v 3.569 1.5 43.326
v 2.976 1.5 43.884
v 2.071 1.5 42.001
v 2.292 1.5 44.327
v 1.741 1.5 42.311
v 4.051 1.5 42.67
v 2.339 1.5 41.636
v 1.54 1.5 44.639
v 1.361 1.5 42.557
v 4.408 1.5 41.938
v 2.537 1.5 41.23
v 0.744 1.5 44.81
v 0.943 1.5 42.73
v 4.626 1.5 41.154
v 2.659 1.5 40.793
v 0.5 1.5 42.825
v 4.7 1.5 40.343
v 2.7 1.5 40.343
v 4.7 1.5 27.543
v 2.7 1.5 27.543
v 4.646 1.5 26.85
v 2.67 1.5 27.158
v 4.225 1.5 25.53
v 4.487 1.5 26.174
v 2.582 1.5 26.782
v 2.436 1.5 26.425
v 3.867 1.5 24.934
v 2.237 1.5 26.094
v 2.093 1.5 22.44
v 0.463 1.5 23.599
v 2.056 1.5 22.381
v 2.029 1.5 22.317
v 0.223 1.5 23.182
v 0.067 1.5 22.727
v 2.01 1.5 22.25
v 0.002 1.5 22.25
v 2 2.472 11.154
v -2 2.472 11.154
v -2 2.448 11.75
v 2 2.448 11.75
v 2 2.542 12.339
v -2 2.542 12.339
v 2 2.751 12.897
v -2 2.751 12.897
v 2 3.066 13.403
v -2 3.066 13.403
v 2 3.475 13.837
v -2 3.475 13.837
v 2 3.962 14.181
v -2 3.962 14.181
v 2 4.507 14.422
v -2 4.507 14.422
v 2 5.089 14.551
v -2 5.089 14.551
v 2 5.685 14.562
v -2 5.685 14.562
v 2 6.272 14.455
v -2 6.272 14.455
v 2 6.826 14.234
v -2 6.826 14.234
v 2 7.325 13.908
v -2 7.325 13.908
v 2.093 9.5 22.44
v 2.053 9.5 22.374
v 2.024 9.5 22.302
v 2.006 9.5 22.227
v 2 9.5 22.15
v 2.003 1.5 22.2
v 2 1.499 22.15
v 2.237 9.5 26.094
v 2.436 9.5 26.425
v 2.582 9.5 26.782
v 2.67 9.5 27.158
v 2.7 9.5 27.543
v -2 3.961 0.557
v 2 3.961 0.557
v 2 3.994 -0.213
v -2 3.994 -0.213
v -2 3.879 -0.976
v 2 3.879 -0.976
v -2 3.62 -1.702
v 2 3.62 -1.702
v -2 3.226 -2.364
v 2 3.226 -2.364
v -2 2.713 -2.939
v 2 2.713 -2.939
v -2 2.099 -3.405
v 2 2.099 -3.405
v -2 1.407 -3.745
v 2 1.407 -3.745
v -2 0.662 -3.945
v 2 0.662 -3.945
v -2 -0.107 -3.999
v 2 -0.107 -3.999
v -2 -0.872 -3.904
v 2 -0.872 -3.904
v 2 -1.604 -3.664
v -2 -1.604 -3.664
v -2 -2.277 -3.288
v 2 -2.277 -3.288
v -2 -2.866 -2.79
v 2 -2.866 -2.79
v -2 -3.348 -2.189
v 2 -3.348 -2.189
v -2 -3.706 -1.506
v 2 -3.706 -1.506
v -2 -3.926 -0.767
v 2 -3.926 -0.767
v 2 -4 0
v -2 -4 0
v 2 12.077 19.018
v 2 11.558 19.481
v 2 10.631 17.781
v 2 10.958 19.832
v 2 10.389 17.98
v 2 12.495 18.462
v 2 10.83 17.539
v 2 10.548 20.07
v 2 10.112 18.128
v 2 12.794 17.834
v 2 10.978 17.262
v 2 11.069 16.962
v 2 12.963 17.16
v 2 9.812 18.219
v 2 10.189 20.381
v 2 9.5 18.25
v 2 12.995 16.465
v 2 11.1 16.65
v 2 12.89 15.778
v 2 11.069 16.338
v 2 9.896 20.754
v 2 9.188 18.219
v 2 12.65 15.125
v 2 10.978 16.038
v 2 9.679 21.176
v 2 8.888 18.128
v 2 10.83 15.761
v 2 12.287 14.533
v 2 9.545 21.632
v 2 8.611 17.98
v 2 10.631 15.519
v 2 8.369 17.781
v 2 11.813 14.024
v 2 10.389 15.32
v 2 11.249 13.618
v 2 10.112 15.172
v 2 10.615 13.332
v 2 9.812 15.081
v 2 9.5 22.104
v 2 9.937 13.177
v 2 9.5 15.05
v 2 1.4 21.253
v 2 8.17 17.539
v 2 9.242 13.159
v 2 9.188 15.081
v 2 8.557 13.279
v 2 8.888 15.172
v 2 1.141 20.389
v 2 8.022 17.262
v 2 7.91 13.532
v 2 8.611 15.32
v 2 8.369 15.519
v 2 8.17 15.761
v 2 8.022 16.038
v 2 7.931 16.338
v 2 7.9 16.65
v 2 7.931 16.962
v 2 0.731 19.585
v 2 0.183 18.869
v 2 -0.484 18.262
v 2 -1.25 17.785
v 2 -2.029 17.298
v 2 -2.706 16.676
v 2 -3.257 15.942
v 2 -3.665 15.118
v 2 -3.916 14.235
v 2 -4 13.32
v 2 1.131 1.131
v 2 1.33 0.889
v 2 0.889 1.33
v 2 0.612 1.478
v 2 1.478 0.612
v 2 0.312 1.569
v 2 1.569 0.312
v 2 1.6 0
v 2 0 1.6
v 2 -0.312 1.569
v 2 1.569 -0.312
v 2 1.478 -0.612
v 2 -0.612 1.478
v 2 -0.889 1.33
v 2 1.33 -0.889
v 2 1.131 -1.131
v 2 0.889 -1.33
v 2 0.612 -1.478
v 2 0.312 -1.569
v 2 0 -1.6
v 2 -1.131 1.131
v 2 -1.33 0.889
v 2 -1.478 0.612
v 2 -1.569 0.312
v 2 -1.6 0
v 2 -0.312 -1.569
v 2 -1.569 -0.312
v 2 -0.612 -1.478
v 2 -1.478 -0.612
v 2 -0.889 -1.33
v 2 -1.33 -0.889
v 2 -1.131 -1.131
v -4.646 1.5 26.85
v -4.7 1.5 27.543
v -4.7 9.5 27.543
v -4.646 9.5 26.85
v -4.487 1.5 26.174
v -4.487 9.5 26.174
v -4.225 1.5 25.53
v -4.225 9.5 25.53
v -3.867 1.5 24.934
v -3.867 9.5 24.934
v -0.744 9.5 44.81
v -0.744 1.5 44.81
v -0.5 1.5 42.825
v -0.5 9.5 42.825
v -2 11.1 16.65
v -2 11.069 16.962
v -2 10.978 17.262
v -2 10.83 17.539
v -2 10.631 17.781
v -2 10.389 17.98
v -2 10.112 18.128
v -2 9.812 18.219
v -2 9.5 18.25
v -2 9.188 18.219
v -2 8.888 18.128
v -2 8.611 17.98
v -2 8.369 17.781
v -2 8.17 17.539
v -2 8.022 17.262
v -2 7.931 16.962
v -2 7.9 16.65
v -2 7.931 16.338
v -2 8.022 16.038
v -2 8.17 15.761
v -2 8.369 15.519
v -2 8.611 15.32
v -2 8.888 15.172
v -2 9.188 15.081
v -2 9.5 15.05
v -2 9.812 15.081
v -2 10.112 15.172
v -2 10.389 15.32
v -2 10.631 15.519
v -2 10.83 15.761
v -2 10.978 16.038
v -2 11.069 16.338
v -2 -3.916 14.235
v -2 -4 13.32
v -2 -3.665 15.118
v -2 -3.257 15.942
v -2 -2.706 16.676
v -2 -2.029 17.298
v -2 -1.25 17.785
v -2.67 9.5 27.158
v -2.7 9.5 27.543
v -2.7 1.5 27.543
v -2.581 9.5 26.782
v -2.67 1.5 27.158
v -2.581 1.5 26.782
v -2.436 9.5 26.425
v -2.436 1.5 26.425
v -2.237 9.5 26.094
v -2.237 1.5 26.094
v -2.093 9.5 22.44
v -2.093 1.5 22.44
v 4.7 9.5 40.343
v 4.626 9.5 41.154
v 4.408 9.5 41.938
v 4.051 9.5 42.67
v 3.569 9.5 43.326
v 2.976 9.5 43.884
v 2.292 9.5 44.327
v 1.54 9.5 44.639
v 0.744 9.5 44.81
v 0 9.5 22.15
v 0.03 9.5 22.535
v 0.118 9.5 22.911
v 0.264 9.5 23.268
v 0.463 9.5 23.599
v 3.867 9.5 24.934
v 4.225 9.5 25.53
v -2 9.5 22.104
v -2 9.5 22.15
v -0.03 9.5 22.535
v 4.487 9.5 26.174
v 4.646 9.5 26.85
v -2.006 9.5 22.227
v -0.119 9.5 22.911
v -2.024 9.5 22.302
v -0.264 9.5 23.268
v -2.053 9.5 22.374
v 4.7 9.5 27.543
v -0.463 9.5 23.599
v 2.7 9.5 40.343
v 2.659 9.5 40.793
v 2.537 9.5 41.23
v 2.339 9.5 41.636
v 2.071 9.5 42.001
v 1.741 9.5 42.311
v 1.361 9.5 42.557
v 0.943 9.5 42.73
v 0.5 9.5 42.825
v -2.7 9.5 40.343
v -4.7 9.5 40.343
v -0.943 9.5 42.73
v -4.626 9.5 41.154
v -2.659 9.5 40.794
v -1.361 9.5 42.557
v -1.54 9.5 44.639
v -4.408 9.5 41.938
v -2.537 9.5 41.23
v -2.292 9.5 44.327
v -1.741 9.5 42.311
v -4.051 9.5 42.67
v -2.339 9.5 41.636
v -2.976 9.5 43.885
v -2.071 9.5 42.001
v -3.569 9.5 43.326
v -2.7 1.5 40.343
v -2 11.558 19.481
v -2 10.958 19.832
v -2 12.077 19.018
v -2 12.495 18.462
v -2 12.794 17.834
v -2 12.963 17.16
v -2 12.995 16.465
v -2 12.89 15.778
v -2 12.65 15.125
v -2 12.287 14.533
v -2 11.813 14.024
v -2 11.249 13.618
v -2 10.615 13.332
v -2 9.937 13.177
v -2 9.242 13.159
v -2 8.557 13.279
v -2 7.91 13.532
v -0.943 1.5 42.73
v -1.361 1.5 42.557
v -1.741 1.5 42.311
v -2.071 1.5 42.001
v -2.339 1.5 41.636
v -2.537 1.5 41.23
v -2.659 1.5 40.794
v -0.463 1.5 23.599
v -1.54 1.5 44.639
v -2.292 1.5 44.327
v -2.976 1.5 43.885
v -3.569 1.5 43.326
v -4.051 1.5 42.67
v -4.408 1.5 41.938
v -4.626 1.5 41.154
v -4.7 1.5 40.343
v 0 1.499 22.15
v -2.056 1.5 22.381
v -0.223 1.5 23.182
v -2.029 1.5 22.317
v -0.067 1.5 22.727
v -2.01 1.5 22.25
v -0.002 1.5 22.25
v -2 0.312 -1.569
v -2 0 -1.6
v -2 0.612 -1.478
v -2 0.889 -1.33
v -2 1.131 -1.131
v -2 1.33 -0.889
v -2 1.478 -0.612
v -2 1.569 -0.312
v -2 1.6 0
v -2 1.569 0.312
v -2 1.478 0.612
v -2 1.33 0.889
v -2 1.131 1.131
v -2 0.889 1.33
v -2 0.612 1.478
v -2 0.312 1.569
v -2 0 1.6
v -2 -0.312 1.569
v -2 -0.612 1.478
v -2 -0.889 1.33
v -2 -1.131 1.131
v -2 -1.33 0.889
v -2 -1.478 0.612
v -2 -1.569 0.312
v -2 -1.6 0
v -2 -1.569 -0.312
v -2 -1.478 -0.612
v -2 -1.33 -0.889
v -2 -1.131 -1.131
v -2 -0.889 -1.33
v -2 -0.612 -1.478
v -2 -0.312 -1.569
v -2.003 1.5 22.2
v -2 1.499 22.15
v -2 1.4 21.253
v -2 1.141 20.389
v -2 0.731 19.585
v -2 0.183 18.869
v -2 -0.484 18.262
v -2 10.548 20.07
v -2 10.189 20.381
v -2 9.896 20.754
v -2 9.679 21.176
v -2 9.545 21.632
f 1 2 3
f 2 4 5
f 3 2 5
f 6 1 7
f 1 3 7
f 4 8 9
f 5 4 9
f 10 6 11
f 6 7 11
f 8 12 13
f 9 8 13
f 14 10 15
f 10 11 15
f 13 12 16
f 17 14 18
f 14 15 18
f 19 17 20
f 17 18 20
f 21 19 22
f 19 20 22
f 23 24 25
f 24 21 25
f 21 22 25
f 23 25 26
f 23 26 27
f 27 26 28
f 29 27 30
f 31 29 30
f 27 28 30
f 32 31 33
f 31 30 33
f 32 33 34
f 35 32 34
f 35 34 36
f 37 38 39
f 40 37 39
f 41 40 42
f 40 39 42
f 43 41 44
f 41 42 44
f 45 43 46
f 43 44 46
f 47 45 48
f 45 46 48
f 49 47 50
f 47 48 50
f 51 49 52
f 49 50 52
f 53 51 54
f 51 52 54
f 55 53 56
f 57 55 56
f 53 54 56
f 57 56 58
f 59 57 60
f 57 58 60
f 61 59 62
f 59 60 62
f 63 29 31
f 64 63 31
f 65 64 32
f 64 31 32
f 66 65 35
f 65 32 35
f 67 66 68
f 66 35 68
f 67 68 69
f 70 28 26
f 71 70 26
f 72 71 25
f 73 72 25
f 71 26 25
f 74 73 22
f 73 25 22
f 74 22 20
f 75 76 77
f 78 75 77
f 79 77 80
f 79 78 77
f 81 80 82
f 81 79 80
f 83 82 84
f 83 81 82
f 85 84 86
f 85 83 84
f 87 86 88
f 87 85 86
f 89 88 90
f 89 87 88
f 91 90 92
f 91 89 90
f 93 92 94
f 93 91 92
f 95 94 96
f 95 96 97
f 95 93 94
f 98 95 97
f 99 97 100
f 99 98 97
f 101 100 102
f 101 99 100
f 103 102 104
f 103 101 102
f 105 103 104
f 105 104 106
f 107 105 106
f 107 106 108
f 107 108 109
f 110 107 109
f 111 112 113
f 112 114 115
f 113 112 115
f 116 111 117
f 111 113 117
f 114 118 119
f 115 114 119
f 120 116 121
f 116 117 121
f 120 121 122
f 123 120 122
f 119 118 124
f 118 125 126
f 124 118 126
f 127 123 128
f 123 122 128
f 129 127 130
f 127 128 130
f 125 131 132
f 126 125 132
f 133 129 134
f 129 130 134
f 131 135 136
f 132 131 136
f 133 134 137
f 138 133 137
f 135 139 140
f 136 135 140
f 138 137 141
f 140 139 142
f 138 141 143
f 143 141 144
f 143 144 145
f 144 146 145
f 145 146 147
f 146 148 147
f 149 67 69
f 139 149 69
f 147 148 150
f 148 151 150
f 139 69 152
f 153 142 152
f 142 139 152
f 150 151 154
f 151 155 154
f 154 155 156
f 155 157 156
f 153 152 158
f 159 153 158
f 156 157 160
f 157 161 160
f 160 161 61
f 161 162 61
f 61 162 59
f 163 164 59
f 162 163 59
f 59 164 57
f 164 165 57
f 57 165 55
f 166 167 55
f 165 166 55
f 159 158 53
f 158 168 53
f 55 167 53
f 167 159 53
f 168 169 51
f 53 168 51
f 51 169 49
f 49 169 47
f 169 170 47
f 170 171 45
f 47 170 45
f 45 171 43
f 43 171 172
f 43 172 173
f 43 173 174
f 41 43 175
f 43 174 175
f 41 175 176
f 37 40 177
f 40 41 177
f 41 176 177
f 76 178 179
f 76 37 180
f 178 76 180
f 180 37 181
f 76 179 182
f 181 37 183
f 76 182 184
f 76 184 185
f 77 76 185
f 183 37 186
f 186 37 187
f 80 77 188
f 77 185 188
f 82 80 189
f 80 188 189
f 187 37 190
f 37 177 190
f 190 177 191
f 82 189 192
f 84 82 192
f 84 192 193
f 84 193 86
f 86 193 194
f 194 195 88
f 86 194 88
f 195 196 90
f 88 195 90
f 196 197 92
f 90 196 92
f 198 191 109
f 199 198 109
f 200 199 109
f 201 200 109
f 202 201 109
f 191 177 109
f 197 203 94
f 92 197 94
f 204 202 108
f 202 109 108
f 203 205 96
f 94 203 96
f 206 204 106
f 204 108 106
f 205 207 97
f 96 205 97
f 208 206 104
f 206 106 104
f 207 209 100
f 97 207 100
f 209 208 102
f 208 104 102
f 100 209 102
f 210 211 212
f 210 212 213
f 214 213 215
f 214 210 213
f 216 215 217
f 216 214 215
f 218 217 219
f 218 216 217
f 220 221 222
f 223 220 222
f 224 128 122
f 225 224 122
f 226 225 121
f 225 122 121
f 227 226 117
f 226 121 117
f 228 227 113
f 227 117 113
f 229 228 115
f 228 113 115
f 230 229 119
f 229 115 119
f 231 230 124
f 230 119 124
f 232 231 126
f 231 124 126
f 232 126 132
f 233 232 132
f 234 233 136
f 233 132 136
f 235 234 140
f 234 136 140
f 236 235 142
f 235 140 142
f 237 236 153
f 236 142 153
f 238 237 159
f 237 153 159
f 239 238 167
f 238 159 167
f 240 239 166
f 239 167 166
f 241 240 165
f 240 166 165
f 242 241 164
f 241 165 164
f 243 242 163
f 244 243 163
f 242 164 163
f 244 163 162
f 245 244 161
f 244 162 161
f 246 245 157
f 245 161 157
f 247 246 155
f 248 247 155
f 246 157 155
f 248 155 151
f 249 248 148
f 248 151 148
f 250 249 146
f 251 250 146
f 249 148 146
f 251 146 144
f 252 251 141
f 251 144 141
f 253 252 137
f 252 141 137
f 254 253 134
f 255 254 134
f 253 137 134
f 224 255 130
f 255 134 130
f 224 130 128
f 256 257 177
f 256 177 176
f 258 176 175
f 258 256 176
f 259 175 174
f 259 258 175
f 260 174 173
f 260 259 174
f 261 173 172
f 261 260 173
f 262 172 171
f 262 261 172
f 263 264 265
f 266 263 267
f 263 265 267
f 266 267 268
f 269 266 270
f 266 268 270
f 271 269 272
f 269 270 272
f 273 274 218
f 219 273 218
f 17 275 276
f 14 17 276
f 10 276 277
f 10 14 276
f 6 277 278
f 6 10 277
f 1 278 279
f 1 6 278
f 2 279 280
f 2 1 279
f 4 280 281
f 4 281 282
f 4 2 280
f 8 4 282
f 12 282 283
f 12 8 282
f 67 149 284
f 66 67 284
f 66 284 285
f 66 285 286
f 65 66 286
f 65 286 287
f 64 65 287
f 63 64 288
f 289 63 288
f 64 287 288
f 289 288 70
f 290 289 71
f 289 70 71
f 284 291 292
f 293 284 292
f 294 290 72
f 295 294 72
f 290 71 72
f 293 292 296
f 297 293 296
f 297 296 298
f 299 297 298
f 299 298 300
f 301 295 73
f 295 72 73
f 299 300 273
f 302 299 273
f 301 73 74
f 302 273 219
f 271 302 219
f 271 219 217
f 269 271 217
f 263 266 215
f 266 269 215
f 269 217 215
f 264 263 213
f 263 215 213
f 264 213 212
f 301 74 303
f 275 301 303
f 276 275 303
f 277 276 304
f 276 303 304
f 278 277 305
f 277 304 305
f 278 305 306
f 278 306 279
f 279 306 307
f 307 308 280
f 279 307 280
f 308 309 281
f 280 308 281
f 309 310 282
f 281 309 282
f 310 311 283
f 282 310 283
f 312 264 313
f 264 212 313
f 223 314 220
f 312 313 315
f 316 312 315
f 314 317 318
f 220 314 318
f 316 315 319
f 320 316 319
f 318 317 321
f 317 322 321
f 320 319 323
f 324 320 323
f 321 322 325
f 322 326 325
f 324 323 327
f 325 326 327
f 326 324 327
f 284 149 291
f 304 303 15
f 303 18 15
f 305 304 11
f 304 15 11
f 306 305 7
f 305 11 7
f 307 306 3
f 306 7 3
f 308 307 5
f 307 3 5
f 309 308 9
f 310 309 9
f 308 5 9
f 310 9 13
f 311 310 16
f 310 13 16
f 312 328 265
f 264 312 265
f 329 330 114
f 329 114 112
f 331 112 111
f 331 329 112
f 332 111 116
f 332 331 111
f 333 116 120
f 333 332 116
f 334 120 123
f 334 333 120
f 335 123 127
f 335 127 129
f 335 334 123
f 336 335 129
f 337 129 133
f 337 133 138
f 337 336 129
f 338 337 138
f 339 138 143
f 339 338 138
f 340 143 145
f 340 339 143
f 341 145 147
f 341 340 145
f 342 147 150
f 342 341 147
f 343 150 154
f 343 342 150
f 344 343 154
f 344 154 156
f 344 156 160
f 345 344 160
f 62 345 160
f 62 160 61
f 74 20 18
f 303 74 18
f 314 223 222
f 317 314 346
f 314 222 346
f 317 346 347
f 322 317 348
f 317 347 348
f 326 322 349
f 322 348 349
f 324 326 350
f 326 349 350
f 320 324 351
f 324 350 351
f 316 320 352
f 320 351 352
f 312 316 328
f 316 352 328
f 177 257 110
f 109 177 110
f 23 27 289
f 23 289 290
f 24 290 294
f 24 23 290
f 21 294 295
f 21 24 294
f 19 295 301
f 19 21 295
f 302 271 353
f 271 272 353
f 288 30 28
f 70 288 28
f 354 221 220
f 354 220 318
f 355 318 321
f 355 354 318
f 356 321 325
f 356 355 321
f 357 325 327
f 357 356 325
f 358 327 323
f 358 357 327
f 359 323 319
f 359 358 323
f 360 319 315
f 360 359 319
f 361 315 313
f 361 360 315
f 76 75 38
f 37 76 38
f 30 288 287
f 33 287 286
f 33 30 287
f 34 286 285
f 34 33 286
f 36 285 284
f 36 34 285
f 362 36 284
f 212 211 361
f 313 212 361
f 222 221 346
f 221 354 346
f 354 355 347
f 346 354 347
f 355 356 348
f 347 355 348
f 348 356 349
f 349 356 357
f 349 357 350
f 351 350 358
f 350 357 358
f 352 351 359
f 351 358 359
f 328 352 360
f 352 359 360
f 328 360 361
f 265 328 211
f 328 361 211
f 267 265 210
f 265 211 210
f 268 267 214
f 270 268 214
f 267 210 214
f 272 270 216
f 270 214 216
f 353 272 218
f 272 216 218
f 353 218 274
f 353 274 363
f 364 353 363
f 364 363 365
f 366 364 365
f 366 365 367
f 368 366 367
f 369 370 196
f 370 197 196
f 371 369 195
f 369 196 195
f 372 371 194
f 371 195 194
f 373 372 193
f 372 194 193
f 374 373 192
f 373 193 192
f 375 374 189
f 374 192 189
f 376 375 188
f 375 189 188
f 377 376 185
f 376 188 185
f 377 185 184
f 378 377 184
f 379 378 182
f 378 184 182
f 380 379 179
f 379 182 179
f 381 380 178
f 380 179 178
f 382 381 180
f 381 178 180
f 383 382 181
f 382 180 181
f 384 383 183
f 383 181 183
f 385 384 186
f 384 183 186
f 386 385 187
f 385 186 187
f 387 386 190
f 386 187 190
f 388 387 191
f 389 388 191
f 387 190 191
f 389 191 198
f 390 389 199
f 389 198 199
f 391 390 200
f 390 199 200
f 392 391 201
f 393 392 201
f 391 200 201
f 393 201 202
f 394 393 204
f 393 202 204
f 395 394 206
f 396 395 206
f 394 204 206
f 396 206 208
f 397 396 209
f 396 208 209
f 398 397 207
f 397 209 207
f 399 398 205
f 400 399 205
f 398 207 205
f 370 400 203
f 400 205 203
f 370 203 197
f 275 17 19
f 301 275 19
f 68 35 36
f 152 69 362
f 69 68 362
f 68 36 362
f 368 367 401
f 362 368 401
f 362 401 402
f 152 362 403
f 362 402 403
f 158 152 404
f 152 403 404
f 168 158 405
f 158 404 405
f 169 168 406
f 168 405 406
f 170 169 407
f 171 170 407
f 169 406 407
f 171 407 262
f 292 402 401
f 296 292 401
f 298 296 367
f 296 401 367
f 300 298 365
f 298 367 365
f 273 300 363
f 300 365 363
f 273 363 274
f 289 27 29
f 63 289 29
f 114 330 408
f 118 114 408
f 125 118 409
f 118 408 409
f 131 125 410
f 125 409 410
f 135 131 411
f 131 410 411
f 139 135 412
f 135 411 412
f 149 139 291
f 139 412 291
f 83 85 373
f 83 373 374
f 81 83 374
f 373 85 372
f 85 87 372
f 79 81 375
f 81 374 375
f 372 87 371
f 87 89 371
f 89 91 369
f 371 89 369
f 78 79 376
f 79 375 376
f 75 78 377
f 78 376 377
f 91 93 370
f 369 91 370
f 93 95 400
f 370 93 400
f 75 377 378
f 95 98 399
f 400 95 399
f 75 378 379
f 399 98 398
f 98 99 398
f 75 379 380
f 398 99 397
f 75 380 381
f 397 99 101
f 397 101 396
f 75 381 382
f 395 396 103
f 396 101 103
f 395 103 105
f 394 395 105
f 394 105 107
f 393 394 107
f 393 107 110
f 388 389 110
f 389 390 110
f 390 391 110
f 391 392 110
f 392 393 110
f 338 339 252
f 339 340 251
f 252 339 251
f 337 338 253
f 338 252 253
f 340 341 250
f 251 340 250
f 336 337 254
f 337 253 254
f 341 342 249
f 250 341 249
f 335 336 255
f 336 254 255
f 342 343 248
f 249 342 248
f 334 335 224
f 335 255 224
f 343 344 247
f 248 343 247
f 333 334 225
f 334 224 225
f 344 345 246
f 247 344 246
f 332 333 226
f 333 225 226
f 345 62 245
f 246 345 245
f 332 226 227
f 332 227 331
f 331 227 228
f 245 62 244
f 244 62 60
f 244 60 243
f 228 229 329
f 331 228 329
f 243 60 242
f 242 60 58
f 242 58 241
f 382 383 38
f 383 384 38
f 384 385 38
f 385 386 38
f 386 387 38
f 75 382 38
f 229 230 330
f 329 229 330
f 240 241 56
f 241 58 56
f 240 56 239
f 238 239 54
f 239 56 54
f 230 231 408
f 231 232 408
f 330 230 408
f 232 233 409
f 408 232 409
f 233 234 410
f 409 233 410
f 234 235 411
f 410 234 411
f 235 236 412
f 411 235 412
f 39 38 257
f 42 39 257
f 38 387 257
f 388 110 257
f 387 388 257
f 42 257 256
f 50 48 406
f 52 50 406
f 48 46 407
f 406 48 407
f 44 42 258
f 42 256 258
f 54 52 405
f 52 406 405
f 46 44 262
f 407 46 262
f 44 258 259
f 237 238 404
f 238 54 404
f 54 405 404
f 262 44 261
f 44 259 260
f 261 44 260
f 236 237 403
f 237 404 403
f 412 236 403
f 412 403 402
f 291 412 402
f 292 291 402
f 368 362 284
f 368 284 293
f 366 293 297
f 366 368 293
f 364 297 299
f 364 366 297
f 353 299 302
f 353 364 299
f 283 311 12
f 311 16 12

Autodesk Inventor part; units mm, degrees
sketch "Skizze_1" plane through (0, 0, 0) normal (0, 1, 0) x (-1, 0, 0)
  line L0 (4.7, 27.5428) -> (4.7, 40.3427)
  arc A0 (4.7, 40.3427) -> (0.7437, 44.8097) centre (0.2, 40.3427) ccw
  line L1 (0.7437, 44.8097) -> (0.5, 42.8246)
  arc A1 (2.7, 40.3427) -> (0.5, 42.8246) centre (0.2, 40.3427) ccw
  line L2 (2.7, 40.3427) -> (2.7, 27.5428)
  arc A2 (2.2372, 26.0938) -> (2.7, 27.5428) centre (0.2, 27.5428) ccw
  line L3 (2.2372, 26.0938) -> (0.4628, 23.599)
  arc A3 (0.4628, 23.599) -> (0, 22.15) centre (2.5, 22.15) ccw
  arc A4 (0, 22.15) -> (-0.4628, 23.599) centre (-2.5, 22.15) ccw
  line L4 (-0.4628, 23.599) -> (-2.2372, 26.0938)
  arc A5 (-2.7, 27.5428) -> (-2.2372, 26.0938) centre (-0.2, 27.5428) ccw
  line L5 (-2.7, 27.5428) -> (-2.7, 40.3427)
  arc A6 (-0.5, 42.8246) -> (-2.7, 40.3427) centre (-0.2, 40.3427) ccw
  line L6 (-0.5, 42.8246) -> (-0.7437, 44.8097)
  arc A7 (-0.7437, 44.8097) -> (-4.7, 40.3427) centre (-0.2, 40.3427) ccw
  line L7 (-4.7, 40.3427) -> (-4.7, 27.5428)
  arc A8 (-4.7, 27.5428) -> (-3.867, 24.9345) centre (-0.2, 27.5428) ccw
  line L8 (-3.867, 24.9345) -> (-2.0926, 22.4398)
  arc A9 (-2, 22.15) -> (-2.0926, 22.4398) centre (-2.5, 22.15) ccw
  line L9 (-2, 22.15) -> (-2, -4)
  line L10 (-2, -4) -> (2, -4)
  line L11 (2, -4) -> (2, 22.15)
  arc A10 (2.0926, 22.4398) -> (2, 22.15) centre (2.5, 22.15) ccw
  line L12 (2.0926, 22.4398) -> (3.867, 24.9345)
  arc A11 (3.867, 24.9345) -> (4.7, 27.5428) centre (0.2, 27.5428) ccw
extrude "Extrusion1" add sketch "Skizze_1" along normal mid plane 40
sketch "Skizze_2" plane through (0, 0, 0) normal (1, 0, 0) x (0, 1, 0)
  line L0 (-60, 105) -> (-60, -73)
  line L1 (-60, -73) -> (65, -73)
  line L2 (65, -73) -> (65, 105)
  line L3 (65, 105) -> (-60, 105)
  line L4 (1.5, 44.8175) -> (1.5, 22.25)
  arc A0 (-1.25, 17.7848) -> (1.5, 22.25) centre (-3.5, 22.25) ccw
  arc A1 (-1.25, 17.7848) -> (-4, 13.3197) centre (1, 13.3197) ccw
  line L5 (-4, 13.3197) -> (-4, 0)
  arc A2 (-4, 0) -> (3.9611, 0.5567) centre (0, 0) ccw
  line L6 (3.9611, 0.5567) -> (2.4717, 11.1545)
  arc A3 (7.3248, 13.908) -> (2.4717, 11.1545) centre (5.4425, 11.572) ccw
  arc A4 (7.3248, 13.908) -> (10.9583, 19.8317) centre (9.5, 16.65) ccw
  arc A5 (9.5, 22.1044) -> (10.9583, 19.8317) centre (12, 22.1044) ccw
  line L7 (9.5, 22.1044) -> (9.5, 44.8175)
  line L8 (9.5, 44.8175) -> (1.5, 44.8175)
extrude "Extrusion2" cut sketch "Skizze_2" along normal mid plane 40
sketch "Skizze_3_ALT_Drilling_1" plane through (0, 0, 0) normal (0, 1, 0) x (-1, 0, 0)
  line L0 (-10, 0) -> (10, 0)
  line L1 (10, 0) -> (10, -1.6)
  line L2 (10, -1.6) -> (-10, -1.6)
  line L3 (-10, -1.6) -> (-10, 0)
  line L4 (-10, 0) -> (10, 0)
revolve "Revolution1" cut sketch "Skizze_3_ALT_Drilling_1" angle 360 about axis through (10, 0, 0) along (1, 0, 0)
sketch "Skizze_4_ALT_Drilling_2" plane through (0, 0, 16.65) normal (0, 0, 1) x (1, 0, 0)
  line L0 (10, 9.5) -> (-10, 9.5)
  line L1 (-10, 9.5) -> (-10, 11.1)
  line L2 (-10, 11.1) -> (10, 11.1)
  line L3 (10, 11.1) -> (10, 9.5)
  line L4 (10, 9.5) -> (-10, 9.5)
revolve "Revolution2" cut sketch "Skizze_4_ALT_Drilling_2" angle 360 about axis through (10, 9.5, 16.65) along (1, 0, 0)
ref_plane "P1_XY" through (0, 9.5, 34.5093) normal (0, 1, 0) x (1, 0, 0)
ref_plane "P1_YZ" through (0, 9.5, 34.5093) normal (1, 0, 0) x (0, 0, -1)
ref_plane "P1_ZX" through (0, 9.5, 34.5093) normal (0, 0, -1) x (0, 1, 0)
ref_plane "P2_XY" through (0, 1.5, 34.5093) normal (0, 1, 0) x (1, 0, 0)
ref_plane "P2_YZ" through (0, 1.5, 34.5093) normal (1, 0, 0) x (0, 0, -1)
ref_plane "P2_ZX" through (0, 1.5, 34.5093) normal (0, 0, -1) x (0, 1, 0)
ref_plane "SA1_XY" through (0, 0, 0) normal (1, 0, 0) x (0, 0, -1)
ref_plane "SA1_YZ" through (0, 0, 0) normal (0, 0, -1) x (0, 1, 0)
ref_plane "SA1_ZX" through (0, 0, 0) normal (0, 1, 0) x (1, 0, 0)
ref_plane "SA2_XY" through (0, 9.5, 16.65) normal (1, 0, 0) x (0, 0, -1)
ref_plane "SA2_YZ" through (0, 9.5, 16.65) normal (0, 0, -1) x (0, 1, 0)
ref_plane "SA2_ZX" through (0, 9.5, 16.65) normal (0, 1, 0) x (1, 0, 0)
ref_plane "SA3_XY" through (0, 5.5, 34.5093) normal (0, 0, 1) x (1, 0, 0)
ref_plane "SA3_YZ" through (0, 5.5, 34.5093) normal (1, 0, 0) x (0, 1, 0)
ref_plane "SA3_ZX" through (0, 5.5, 34.5093) normal (0, 1, 0) x (0, 0, 1)
properties part number "305106_7-KOMP"
